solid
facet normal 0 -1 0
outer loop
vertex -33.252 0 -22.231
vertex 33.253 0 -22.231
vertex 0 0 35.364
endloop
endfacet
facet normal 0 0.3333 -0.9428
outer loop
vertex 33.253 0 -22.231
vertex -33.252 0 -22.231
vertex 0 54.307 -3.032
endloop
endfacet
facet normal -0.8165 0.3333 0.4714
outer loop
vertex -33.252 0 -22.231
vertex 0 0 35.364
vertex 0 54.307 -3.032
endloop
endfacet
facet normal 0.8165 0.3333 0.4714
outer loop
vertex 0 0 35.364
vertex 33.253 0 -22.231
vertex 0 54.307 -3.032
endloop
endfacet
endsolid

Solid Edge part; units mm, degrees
sketch "Sketch1" plane through (0, 0, 0) normal (0, -1, 0) x (1, 0, 0)
  line L0 (0, 35.3649) -> (33.2532, -22.2312)
  line L1 (33.2532, -22.2312) -> (-33.2532, -22.2312)
  line L2 (-33.2532, -22.2312) -> (0, 35.3649)
extrude "Protrusion1" add sketch "Sketch1" against normal blind 70
sketch "Sketch2" plane through (-6.5236, 32.9986, 0.7339) normal (-0.8165, 0.3333, 0.4714) x (0.5, 0, 0.866)
  line L0 (-33.2532, 40.5959) -> (-33.2532, -35)
  line L1 (-33.2532, -35) -> (33.2532, -35)
  line L2 (33.2532, -35) -> (33.2532, 40.5959)
  line L3 (33.2532, 40.5959) -> (-33.2532, 40.5959)
extrude "ExtrudedCutout_1" cut sketch "Sketch2" along normal blind 26.7423
pattern_circular "Pattern1" count 3 over 360 about axis through (0, 0, -3.0325) along (0, 1, 0) of "ExtrudedCutout_1"
